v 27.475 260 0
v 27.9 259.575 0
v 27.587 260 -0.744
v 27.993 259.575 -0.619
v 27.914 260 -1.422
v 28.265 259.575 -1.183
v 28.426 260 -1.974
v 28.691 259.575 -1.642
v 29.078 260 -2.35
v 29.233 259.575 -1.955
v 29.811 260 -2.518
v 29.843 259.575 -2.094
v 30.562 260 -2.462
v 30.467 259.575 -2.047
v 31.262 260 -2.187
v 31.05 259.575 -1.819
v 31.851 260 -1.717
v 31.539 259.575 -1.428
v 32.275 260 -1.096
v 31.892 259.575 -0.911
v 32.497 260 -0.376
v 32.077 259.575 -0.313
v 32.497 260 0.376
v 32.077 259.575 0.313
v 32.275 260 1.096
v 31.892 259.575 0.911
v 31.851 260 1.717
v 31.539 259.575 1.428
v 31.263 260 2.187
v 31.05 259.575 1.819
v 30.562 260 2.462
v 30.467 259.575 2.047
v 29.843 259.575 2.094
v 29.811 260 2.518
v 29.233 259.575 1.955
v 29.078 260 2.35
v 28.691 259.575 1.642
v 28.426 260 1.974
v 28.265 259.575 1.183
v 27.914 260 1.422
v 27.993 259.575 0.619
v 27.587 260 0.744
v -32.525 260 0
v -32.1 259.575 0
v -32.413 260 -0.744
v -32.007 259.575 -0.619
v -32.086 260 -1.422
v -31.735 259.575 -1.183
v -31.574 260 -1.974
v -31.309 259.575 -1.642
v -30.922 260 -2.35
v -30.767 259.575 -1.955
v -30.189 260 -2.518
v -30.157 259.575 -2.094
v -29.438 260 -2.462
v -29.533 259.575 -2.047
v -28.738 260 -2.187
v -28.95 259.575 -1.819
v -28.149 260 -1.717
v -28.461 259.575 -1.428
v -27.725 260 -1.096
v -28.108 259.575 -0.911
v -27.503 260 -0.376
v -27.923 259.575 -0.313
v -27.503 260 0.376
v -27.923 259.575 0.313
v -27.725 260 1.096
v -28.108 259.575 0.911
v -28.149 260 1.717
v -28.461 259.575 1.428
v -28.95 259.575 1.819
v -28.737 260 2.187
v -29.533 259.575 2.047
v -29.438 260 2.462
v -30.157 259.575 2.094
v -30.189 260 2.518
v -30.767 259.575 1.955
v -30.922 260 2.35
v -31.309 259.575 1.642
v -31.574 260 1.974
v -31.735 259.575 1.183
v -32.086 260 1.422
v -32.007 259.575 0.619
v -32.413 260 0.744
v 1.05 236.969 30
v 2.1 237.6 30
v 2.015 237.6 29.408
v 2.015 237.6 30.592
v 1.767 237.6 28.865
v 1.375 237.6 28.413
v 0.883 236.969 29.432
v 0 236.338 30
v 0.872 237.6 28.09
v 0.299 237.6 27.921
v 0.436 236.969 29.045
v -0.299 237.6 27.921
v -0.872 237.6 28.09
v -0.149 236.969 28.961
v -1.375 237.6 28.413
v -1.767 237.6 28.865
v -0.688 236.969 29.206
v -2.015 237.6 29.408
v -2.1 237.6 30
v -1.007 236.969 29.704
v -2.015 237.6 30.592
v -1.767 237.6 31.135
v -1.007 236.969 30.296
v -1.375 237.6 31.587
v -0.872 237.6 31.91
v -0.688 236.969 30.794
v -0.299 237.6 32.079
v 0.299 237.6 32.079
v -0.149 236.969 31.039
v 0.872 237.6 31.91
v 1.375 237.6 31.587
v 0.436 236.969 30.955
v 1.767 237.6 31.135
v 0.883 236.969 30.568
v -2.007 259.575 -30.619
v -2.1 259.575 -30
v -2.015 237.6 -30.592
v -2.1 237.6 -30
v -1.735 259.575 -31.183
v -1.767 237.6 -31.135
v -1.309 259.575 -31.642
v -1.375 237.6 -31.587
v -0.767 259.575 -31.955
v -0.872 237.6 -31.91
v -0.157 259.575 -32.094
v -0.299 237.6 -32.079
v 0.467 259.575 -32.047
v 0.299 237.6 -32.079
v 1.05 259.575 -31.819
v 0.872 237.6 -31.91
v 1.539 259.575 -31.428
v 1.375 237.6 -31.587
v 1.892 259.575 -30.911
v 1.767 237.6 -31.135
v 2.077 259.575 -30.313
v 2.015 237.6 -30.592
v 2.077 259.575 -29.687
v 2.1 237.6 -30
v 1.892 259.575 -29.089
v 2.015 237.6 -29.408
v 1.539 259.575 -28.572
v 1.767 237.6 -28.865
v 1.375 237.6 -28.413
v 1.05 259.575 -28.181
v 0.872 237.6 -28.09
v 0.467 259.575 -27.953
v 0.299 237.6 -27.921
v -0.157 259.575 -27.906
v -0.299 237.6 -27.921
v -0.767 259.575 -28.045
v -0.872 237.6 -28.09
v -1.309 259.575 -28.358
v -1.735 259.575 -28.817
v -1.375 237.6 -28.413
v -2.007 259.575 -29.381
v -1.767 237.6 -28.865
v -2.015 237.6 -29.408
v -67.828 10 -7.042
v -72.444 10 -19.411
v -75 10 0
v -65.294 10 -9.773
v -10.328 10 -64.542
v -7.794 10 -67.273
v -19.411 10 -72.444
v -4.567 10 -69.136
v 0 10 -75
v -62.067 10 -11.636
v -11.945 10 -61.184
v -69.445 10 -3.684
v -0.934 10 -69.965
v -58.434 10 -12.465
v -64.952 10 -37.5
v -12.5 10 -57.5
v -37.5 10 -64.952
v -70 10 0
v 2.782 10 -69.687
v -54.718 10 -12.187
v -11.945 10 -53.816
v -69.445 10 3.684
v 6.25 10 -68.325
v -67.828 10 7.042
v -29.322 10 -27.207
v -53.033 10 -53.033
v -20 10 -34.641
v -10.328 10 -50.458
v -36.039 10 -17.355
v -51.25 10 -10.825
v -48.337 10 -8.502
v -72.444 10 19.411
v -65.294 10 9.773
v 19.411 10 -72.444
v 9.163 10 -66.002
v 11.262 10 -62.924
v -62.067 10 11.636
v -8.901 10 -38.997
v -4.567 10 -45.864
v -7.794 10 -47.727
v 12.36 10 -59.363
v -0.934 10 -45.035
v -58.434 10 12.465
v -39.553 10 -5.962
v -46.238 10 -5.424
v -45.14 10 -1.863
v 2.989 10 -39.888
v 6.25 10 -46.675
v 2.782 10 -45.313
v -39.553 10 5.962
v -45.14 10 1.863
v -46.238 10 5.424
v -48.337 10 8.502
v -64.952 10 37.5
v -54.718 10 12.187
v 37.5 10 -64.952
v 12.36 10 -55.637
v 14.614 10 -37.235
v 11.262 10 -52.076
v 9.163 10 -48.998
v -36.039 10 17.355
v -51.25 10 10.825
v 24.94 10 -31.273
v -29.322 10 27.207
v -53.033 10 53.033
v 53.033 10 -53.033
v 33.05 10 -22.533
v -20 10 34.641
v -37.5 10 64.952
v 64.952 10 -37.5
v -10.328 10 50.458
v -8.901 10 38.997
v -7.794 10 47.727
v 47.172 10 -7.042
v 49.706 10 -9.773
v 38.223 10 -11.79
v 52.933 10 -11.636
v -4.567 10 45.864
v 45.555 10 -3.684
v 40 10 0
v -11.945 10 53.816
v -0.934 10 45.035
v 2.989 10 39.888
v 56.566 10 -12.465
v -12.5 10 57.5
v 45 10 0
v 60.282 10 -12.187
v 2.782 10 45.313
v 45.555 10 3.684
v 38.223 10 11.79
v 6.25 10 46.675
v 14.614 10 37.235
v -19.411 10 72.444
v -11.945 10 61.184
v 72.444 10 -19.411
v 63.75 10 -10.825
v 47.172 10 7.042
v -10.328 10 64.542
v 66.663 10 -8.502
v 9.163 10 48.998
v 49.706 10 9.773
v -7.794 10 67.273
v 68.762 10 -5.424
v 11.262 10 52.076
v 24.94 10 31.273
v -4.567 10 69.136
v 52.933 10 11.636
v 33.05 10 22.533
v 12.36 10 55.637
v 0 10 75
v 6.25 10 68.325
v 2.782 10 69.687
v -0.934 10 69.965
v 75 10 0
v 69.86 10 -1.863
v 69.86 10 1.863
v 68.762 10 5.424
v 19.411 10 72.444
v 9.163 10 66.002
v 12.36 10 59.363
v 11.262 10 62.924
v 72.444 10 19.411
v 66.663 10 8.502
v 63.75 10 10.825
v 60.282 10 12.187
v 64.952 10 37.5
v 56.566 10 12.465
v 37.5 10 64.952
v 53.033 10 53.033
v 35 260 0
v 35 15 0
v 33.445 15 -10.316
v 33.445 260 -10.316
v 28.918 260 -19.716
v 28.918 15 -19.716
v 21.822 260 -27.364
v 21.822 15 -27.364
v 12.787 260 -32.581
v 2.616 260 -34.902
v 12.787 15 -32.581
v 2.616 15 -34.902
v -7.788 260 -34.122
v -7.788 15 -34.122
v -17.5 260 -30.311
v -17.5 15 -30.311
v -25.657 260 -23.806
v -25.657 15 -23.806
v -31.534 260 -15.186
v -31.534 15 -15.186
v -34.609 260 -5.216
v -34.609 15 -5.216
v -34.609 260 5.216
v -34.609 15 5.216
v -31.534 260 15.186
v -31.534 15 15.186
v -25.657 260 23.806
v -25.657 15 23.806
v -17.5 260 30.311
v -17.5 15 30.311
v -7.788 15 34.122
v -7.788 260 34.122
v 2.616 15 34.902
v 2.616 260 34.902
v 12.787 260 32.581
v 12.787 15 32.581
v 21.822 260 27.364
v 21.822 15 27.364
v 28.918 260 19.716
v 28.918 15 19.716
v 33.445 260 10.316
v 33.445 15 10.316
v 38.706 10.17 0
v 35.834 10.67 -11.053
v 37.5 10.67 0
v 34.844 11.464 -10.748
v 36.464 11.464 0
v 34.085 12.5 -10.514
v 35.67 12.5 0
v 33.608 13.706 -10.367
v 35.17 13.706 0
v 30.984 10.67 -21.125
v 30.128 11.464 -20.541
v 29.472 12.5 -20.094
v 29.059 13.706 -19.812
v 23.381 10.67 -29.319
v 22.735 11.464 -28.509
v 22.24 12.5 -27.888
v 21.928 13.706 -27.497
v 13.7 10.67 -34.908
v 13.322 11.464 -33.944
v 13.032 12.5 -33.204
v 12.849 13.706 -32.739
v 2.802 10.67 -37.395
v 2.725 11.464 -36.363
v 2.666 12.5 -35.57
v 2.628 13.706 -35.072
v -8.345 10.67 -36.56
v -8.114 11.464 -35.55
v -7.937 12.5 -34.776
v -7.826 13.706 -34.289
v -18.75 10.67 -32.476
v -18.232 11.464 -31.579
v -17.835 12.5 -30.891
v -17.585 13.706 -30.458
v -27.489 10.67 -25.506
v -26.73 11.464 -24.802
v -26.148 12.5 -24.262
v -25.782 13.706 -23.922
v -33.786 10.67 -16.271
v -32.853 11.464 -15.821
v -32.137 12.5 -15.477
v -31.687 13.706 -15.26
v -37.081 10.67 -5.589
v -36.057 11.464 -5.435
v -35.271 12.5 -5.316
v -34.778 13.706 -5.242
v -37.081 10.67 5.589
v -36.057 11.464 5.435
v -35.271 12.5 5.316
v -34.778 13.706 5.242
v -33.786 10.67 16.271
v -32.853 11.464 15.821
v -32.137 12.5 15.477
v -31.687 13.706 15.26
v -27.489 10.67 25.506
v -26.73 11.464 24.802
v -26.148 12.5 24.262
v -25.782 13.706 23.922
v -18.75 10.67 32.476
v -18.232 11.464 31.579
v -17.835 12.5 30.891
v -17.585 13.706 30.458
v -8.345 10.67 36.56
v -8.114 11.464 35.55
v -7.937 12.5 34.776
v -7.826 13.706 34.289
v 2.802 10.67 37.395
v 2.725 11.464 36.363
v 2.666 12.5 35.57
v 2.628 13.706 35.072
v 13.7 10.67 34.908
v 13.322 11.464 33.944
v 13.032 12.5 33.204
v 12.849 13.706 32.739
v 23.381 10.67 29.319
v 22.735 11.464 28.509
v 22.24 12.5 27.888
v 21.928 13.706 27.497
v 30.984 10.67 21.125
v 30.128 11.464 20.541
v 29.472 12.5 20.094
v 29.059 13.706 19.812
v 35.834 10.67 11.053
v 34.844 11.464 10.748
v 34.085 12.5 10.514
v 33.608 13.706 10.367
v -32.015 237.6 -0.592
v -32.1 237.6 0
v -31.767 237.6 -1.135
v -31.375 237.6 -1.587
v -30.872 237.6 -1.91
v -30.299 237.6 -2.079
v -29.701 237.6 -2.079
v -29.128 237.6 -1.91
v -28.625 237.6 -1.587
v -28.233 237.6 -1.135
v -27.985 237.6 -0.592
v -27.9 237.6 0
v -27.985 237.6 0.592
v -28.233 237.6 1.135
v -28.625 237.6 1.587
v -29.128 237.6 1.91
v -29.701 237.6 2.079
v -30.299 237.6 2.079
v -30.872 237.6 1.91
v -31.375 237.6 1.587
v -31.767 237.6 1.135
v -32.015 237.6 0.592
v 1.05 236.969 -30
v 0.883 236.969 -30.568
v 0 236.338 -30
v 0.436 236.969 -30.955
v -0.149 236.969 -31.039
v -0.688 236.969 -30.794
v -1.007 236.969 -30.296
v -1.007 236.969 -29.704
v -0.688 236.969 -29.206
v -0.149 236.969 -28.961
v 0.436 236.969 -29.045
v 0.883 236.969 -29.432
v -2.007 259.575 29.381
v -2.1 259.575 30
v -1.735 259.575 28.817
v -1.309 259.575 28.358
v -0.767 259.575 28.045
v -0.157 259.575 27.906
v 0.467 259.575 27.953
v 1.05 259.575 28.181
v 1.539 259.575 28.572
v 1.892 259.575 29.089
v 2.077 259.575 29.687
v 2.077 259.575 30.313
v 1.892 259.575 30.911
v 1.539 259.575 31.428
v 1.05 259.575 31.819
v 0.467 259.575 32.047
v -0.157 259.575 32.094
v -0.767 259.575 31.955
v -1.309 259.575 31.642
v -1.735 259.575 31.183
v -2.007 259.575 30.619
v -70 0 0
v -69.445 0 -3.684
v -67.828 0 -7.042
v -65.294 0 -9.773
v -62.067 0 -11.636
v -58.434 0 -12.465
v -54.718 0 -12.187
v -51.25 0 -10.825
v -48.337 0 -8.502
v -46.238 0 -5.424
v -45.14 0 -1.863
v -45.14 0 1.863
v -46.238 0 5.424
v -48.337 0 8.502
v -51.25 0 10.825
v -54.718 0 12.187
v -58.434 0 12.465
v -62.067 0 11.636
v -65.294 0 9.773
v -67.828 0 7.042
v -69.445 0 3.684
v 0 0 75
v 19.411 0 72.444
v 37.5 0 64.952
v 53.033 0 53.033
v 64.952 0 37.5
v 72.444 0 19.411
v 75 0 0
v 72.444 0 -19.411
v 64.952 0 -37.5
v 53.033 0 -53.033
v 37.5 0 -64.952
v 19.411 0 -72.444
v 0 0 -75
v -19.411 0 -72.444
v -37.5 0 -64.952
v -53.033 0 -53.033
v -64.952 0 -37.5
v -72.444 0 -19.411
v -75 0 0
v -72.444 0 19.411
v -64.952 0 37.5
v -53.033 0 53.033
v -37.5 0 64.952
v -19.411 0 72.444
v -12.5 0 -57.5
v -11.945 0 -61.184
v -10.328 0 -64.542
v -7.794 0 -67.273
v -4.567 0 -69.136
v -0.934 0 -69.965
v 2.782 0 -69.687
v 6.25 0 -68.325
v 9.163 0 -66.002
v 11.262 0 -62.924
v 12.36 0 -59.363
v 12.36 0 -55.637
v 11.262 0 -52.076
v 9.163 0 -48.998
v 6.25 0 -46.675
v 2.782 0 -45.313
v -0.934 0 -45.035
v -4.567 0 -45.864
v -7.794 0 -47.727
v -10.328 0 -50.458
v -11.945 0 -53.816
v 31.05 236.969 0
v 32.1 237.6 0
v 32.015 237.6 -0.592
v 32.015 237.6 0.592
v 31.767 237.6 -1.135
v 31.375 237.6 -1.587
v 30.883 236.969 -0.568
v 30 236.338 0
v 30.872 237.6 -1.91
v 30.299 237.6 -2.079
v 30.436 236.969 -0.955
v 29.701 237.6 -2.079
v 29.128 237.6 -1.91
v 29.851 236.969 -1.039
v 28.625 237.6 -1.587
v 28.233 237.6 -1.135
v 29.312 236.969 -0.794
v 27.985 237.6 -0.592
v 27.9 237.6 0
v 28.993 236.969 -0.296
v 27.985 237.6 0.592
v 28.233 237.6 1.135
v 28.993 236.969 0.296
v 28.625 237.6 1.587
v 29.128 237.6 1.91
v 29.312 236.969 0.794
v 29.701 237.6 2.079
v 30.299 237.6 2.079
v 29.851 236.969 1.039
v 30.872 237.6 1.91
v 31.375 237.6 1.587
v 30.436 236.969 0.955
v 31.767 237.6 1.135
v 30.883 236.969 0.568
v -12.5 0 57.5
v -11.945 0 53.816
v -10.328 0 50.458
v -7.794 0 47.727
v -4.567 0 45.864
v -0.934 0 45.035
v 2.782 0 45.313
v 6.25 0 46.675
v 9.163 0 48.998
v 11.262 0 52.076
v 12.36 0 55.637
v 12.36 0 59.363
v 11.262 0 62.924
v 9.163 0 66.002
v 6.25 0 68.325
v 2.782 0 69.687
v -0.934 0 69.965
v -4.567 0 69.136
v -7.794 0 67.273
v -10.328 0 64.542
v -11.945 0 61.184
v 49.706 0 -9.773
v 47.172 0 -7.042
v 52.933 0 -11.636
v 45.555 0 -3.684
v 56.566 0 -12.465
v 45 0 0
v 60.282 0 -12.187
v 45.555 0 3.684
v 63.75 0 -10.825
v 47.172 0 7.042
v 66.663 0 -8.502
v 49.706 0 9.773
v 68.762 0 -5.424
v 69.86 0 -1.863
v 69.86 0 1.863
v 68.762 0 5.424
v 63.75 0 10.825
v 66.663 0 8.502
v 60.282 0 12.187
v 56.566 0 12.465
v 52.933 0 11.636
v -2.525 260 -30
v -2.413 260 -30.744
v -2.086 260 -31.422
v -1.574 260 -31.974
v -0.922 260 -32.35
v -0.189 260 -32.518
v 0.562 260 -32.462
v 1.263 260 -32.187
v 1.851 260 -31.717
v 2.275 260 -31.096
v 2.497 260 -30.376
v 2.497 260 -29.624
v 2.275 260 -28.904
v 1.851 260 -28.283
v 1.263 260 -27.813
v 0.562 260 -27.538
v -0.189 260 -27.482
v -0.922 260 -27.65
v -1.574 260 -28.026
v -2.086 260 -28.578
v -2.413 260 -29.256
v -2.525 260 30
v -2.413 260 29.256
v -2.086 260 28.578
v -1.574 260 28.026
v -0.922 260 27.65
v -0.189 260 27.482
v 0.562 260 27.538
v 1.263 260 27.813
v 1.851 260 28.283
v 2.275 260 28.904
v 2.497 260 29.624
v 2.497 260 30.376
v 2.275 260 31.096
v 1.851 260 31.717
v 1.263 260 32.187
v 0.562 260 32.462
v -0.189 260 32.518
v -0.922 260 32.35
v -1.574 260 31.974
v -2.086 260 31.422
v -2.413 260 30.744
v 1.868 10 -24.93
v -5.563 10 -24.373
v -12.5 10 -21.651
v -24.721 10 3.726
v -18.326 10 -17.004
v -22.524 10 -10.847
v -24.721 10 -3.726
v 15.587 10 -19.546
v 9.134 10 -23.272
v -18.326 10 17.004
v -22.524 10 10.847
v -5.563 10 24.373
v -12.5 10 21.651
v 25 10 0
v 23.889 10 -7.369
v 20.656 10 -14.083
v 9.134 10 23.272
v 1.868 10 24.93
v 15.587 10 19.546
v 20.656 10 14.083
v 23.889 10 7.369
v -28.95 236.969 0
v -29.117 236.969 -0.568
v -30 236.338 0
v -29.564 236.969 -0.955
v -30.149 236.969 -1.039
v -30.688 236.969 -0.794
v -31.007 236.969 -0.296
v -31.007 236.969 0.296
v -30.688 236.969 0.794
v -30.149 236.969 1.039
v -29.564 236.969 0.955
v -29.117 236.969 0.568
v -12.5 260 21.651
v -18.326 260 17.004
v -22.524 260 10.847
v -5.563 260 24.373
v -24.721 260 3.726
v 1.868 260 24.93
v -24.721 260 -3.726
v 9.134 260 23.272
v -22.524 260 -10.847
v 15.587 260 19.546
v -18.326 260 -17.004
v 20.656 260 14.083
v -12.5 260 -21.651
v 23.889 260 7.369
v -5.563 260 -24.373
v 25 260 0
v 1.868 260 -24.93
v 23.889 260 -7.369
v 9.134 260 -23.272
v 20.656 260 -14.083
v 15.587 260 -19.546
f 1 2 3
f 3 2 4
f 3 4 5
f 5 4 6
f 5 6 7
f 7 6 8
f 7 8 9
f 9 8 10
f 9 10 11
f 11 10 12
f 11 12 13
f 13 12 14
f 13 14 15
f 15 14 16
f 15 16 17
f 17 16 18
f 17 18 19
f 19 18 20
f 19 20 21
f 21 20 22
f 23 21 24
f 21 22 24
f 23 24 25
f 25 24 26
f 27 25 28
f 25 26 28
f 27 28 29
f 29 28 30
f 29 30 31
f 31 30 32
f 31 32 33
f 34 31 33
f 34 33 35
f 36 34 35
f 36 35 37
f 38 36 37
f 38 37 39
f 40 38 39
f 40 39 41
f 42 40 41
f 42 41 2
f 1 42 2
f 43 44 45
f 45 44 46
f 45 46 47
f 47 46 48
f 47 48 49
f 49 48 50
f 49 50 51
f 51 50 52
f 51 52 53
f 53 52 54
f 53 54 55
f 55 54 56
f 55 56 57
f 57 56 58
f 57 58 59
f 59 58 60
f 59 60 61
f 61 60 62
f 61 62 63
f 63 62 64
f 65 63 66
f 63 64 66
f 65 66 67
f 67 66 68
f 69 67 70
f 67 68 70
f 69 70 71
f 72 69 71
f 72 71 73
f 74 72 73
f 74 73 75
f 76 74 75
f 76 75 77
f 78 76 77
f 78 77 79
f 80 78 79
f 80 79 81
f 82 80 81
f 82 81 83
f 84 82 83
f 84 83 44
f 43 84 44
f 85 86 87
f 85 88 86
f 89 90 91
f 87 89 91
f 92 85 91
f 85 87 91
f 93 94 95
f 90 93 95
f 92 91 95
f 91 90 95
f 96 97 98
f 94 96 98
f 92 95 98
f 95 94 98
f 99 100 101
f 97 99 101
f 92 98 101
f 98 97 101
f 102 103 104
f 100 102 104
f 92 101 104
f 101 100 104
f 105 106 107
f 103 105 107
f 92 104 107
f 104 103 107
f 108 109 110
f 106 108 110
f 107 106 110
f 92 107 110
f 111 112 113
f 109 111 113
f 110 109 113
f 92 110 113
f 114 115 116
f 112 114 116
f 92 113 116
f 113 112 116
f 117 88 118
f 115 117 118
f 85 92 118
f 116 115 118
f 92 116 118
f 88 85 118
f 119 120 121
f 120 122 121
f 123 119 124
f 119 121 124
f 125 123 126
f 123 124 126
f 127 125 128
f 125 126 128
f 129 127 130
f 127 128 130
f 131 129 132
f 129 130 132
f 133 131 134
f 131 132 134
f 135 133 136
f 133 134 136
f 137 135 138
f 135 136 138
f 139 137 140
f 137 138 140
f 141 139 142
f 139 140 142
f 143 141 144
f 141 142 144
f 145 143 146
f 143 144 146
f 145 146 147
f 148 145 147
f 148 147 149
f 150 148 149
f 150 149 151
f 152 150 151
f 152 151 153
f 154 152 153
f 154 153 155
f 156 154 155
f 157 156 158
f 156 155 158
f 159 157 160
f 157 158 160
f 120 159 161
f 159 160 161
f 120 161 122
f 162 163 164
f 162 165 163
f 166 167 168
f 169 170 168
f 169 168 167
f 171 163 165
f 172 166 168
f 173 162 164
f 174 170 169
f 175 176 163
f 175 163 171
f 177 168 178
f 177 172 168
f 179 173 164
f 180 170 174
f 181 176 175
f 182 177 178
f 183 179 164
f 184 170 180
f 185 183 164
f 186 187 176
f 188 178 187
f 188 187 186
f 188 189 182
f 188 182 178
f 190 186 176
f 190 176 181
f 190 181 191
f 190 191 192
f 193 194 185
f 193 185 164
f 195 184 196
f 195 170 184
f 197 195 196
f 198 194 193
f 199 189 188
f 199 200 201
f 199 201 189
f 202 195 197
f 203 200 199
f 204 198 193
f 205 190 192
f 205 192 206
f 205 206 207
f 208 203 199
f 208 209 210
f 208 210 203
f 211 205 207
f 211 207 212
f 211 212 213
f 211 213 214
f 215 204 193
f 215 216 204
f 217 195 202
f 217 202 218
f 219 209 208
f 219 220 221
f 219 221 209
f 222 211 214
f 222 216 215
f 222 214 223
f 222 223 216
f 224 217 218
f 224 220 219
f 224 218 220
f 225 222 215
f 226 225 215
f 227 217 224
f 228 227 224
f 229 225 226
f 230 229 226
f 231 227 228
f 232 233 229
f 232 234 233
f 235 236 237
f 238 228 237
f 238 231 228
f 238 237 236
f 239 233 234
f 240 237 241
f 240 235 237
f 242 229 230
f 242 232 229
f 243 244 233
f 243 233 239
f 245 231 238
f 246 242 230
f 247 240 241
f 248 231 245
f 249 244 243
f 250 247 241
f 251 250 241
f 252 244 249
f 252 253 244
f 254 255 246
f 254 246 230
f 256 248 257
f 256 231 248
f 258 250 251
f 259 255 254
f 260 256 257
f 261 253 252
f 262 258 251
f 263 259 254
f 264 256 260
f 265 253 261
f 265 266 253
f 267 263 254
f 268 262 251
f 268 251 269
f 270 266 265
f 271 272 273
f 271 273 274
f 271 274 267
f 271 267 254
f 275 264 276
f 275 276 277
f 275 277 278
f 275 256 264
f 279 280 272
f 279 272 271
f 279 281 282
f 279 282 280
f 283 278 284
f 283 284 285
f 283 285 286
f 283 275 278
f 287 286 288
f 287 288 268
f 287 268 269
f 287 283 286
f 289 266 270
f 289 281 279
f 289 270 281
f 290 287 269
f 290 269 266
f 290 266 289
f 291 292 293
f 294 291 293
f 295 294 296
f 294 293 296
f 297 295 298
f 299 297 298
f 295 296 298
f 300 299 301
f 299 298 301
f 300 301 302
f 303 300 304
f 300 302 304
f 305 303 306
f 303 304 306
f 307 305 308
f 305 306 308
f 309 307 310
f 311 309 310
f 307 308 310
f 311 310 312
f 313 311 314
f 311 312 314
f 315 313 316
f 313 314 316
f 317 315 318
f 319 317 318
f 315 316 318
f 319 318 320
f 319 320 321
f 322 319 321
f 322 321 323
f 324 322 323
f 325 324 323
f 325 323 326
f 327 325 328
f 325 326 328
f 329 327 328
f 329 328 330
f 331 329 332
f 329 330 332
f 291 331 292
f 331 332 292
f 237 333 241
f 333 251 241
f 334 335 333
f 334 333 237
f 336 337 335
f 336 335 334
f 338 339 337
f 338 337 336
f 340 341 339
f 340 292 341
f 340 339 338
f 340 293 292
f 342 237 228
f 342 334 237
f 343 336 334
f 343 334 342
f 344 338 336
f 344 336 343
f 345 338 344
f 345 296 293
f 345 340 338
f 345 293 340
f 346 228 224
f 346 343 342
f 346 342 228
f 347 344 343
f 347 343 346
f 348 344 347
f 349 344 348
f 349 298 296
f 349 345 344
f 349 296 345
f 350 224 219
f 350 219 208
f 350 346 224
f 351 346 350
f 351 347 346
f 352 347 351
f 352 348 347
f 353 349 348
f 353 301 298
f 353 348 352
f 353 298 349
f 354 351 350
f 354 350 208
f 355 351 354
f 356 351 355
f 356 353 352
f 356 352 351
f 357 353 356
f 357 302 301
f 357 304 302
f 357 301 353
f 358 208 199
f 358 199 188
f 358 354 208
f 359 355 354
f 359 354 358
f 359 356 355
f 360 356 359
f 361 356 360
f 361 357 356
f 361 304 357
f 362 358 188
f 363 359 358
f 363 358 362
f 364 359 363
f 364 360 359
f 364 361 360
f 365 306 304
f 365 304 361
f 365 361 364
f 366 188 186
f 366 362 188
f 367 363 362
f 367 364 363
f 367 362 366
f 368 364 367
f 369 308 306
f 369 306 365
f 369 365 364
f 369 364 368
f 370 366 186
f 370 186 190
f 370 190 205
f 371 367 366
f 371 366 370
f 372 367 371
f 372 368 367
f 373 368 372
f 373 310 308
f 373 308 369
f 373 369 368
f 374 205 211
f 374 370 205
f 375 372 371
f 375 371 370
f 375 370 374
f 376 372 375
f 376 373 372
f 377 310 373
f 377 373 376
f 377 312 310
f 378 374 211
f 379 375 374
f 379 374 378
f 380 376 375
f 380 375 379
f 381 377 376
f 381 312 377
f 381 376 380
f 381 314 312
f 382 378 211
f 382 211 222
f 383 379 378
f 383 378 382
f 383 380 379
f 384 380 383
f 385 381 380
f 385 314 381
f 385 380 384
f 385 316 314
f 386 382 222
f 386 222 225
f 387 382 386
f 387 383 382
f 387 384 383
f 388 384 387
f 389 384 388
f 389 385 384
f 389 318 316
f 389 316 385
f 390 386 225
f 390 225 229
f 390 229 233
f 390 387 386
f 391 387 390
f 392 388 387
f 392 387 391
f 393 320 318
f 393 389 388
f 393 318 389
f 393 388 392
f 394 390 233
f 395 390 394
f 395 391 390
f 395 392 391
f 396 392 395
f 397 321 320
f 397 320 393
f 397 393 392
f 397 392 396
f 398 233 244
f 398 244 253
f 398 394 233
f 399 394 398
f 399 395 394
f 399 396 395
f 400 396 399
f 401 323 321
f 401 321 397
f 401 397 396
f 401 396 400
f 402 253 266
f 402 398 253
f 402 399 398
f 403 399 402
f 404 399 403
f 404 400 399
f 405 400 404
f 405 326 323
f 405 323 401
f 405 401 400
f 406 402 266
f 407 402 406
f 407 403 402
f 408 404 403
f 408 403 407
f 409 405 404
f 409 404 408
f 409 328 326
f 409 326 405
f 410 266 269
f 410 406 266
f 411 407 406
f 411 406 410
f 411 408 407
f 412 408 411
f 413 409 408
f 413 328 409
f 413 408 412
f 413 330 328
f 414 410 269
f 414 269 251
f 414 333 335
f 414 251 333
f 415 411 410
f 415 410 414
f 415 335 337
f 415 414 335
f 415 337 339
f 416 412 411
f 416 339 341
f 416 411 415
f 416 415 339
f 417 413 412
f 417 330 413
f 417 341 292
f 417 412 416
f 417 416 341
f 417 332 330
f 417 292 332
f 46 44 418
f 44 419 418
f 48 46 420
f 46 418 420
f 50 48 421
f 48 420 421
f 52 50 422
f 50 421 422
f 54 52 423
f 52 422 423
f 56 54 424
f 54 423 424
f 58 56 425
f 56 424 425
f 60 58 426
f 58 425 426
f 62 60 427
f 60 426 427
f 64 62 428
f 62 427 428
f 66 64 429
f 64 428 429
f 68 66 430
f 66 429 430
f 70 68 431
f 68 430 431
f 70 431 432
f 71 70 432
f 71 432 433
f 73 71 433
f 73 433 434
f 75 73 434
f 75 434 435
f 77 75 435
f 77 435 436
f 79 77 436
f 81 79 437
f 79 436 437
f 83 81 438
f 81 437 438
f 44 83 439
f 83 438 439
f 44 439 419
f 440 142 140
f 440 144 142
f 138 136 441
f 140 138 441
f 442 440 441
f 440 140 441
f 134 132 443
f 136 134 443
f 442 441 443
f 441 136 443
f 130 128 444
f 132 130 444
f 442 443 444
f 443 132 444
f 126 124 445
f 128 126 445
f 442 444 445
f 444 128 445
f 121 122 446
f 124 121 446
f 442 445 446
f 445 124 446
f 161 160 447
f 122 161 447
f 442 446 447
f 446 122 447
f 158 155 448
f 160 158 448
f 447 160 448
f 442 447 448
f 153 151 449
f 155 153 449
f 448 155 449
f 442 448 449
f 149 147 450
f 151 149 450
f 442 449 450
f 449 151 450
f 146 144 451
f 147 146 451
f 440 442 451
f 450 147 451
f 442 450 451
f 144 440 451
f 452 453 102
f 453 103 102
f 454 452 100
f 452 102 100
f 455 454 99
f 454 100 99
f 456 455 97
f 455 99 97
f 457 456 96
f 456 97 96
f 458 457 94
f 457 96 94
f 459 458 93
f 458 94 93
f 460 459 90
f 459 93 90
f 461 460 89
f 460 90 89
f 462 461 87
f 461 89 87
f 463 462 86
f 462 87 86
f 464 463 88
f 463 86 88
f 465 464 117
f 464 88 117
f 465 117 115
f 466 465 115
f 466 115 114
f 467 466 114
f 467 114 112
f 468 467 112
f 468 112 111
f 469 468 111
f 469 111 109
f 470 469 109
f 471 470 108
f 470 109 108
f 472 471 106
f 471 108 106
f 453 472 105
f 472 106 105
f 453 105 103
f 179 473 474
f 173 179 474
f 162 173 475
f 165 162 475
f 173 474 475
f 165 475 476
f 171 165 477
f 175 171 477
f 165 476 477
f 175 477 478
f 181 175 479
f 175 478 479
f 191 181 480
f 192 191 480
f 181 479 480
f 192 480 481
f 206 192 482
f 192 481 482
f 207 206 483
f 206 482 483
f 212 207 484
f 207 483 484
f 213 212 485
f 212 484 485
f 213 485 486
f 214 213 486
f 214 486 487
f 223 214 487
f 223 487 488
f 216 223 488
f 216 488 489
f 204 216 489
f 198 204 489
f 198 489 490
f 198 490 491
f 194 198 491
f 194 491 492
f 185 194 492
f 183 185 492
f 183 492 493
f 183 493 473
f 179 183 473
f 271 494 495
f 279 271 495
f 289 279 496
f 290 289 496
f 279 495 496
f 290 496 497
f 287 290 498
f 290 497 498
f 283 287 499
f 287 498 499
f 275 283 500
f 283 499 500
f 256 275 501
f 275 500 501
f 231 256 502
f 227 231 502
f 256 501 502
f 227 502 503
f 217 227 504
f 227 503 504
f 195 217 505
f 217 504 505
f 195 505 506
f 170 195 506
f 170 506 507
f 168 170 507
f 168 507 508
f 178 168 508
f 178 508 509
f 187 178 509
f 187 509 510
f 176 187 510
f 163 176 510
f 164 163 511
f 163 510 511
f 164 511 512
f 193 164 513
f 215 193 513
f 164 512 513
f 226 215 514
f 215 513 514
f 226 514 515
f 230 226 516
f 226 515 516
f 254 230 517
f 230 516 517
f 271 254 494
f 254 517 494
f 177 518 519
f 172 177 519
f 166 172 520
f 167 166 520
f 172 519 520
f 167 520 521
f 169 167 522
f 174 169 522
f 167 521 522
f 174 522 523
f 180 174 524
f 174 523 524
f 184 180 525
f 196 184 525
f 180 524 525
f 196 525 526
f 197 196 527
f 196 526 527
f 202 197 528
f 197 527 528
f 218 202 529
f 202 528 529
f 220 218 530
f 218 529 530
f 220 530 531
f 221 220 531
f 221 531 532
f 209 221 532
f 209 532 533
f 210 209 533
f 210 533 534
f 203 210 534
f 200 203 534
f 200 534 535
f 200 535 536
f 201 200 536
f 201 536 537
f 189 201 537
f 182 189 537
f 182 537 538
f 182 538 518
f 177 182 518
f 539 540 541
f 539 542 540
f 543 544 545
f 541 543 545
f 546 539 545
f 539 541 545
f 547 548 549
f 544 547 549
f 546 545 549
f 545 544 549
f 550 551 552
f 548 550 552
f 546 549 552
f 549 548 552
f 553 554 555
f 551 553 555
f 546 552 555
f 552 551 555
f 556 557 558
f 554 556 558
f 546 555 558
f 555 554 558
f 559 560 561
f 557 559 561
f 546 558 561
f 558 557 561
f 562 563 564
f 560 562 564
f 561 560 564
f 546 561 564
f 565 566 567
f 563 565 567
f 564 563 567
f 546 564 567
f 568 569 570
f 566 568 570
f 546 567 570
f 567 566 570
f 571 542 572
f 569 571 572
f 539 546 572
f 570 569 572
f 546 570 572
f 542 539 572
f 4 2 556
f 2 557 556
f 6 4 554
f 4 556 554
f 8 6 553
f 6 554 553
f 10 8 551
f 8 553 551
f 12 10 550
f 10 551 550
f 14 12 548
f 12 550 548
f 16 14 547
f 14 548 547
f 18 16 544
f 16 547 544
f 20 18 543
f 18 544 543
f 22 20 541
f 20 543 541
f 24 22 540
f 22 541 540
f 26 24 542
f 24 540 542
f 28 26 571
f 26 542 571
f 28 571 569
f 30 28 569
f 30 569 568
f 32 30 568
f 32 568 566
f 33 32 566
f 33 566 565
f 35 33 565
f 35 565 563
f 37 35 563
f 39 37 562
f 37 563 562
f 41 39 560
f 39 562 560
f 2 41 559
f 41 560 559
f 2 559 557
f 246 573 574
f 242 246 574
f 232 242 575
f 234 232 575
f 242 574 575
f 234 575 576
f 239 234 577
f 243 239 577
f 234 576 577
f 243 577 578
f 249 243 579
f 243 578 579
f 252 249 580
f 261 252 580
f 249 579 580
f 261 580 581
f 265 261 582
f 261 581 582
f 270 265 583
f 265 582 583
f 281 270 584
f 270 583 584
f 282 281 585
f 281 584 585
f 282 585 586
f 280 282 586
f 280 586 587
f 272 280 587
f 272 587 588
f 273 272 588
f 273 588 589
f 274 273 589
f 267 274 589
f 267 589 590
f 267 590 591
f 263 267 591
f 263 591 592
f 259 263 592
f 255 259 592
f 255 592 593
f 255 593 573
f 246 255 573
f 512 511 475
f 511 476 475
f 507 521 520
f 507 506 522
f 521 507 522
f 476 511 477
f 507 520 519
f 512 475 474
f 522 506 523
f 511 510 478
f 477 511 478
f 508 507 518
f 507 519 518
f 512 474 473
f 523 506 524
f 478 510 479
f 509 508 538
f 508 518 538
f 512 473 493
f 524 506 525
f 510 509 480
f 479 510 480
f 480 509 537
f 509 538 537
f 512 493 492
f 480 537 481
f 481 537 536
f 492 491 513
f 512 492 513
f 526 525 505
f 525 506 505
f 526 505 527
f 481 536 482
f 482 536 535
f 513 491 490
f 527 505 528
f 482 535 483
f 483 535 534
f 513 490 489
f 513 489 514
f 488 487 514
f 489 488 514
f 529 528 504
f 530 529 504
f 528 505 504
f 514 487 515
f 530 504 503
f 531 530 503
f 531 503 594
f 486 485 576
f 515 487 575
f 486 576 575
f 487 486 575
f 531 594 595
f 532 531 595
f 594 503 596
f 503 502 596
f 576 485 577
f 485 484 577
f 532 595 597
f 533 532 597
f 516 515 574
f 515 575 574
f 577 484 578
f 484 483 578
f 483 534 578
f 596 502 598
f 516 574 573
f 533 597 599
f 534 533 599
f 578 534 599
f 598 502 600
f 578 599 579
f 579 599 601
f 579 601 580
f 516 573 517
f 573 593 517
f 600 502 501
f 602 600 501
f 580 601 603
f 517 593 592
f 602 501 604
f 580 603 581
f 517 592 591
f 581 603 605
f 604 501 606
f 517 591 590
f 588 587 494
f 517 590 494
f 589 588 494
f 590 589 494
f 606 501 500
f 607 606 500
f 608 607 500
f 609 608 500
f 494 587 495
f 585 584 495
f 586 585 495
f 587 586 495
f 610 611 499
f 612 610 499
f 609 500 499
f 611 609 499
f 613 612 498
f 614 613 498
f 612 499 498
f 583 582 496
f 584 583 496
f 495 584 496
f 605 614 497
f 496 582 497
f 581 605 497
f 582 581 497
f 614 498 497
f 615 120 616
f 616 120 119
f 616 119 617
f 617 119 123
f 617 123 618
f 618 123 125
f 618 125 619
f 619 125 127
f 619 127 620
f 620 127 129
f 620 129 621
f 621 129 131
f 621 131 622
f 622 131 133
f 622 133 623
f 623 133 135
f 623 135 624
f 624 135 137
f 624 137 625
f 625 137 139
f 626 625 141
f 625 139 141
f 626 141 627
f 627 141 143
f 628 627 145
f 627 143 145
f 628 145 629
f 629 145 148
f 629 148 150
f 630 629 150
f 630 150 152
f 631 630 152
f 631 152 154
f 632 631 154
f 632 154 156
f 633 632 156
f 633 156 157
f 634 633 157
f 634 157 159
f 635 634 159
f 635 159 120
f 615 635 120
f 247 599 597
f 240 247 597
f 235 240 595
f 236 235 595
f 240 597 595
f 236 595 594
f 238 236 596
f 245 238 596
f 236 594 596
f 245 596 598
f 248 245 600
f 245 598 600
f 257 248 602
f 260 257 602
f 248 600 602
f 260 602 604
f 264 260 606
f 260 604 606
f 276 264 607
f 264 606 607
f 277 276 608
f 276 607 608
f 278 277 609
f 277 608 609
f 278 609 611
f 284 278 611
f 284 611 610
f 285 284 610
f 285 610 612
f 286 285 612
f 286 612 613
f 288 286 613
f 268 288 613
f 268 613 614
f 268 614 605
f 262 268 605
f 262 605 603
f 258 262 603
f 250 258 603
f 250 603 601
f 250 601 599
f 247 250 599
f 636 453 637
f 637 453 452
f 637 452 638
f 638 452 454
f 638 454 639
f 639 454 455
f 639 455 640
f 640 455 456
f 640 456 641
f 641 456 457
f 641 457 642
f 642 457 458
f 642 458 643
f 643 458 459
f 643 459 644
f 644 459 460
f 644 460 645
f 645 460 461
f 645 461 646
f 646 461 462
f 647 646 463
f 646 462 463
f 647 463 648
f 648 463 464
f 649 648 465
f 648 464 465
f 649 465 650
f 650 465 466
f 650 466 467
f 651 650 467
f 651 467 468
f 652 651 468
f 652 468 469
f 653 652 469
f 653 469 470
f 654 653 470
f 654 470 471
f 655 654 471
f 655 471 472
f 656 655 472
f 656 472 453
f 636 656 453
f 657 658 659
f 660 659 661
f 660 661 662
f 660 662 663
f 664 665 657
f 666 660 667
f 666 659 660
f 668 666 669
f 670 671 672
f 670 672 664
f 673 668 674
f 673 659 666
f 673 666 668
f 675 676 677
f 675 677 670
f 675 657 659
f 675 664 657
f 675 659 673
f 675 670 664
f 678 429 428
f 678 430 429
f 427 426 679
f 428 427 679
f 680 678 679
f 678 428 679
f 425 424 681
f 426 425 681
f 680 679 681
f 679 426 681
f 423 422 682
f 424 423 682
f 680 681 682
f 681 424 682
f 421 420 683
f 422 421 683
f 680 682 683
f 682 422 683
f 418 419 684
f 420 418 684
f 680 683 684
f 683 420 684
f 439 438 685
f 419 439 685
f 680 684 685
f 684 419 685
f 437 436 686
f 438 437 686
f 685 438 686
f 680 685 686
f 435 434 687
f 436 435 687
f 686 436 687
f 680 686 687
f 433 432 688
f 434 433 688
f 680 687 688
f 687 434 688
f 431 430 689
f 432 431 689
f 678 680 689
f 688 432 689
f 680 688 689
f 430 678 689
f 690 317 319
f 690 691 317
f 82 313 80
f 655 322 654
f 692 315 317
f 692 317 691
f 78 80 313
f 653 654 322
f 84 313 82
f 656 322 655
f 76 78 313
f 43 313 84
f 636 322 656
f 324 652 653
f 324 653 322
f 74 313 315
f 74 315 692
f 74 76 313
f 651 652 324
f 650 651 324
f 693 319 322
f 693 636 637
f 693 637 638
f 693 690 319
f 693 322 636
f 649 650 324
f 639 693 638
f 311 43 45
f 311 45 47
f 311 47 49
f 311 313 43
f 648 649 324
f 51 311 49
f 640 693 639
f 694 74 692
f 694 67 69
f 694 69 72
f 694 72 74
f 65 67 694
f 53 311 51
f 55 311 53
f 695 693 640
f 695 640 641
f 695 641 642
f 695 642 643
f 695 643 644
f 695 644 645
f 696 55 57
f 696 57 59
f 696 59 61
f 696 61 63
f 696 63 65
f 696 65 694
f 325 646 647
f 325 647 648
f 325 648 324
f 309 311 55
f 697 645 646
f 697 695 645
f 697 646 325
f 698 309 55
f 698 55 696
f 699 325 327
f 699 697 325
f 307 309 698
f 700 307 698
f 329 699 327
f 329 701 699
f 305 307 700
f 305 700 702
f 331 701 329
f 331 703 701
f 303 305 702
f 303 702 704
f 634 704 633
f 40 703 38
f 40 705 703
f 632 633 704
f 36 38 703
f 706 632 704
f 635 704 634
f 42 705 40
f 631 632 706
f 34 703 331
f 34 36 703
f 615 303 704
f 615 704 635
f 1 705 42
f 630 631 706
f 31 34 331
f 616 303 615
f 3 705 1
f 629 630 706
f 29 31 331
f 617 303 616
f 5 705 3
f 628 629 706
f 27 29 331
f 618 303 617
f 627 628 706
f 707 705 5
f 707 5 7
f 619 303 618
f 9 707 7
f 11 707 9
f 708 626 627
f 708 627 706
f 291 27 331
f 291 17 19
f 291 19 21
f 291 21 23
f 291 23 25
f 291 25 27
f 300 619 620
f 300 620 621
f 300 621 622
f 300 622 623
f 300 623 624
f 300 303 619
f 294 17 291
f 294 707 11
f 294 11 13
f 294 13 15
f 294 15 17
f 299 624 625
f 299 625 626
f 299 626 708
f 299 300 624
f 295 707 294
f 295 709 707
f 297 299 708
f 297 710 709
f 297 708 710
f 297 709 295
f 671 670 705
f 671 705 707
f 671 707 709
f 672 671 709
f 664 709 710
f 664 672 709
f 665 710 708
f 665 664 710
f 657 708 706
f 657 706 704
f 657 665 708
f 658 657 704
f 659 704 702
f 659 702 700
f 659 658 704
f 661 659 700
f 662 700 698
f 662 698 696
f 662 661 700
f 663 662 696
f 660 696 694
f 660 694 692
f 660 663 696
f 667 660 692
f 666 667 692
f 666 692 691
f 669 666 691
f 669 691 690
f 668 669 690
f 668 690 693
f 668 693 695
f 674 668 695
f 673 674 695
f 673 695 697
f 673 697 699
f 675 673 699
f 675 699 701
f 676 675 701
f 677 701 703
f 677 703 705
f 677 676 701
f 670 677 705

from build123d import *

# Parameters (mm, degrees)
SKETCH_1_R                   = 75
EXTRUDE_1_DEPTH              = 10
SKETCH_2_R                   = 35
SKETCH_2_R_2                 = 25
EXTRUDE_1_2_DEPTH            = 250
HOLE_WIZARD_1_D              = 25
HOLE_WIZARD_M5_1_D           = 4.2
HOLE_WIZARD_M5_1_DEPTH       = 22.4
HOLE_WIZARD_M5_1_CSINK_D     = 5.05
HOLE_WIZARD_M5_1_CSINK_ANGLE = 90
HOLE_WIZARD_M5_1_TIP         = 1.2618073
FILLET_1_R                   = 5


with BuildPart() as part:
    # 草图1 → Extrude 1 (new body)
    with BuildSketch(Plane(origin=(0, 0, 0), x_dir=(1, 0, 0), z_dir=(0, 1, 0))):
        with Locations(Location((0, 0, 0), (0, 0, 270))):
            Circle(SKETCH_1_R)
    extrude(amount=EXTRUDE_1_DEPTH)

    # 草图2 → Extrude 1 2 (add)
    with BuildSketch(Plane(origin=(0, 10, 0), x_dir=(1, 0, 0), z_dir=(0, 1, 0))):
        Circle(SKETCH_2_R)
        Circle(SKETCH_2_R_2, mode=Mode.SUBTRACT)
    extrude(amount=EXTRUDE_1_2_DEPTH)

    # 孔1 (through all)
    with Locations(Plane(origin=(0, 10, 0), x_dir=(1, 0, 0), z_dir=(0, 1, 0))):
        with Locations((0, 57.5), (57.5, 0), (0, -57.5), (-57.5, 0)):
            Hole(HOLE_WIZARD_1_D / 2)

    # M5 螺纹孔1
    with Locations(Plane(origin=(0, 260, 0), x_dir=(1, 0, 0), z_dir=(0, 1, 0))):
        with Locations((0, -30), (-30, 0), (0, 30), (30, 0)):
            CounterSinkHole(HOLE_WIZARD_M5_1_D / 2, HOLE_WIZARD_M5_1_CSINK_D / 2, depth=HOLE_WIZARD_M5_1_DEPTH, counter_sink_angle=HOLE_WIZARD_M5_1_CSINK_ANGLE)
            with Locations((0, 0, -(HOLE_WIZARD_M5_1_DEPTH + HOLE_WIZARD_M5_1_TIP / 2))):  # 118° drill point
                Cone(0, HOLE_WIZARD_M5_1_D / 2, HOLE_WIZARD_M5_1_TIP, mode=Mode.SUBTRACT)

    # 圆角1
    fillet_1_edges = [part.edges().sort_by_distance(p)[0] for p in [
        (-35, 10, 0),
    ]]
    fillet(fillet_1_edges, radius=FILLET_1_R)


solid = part.part
